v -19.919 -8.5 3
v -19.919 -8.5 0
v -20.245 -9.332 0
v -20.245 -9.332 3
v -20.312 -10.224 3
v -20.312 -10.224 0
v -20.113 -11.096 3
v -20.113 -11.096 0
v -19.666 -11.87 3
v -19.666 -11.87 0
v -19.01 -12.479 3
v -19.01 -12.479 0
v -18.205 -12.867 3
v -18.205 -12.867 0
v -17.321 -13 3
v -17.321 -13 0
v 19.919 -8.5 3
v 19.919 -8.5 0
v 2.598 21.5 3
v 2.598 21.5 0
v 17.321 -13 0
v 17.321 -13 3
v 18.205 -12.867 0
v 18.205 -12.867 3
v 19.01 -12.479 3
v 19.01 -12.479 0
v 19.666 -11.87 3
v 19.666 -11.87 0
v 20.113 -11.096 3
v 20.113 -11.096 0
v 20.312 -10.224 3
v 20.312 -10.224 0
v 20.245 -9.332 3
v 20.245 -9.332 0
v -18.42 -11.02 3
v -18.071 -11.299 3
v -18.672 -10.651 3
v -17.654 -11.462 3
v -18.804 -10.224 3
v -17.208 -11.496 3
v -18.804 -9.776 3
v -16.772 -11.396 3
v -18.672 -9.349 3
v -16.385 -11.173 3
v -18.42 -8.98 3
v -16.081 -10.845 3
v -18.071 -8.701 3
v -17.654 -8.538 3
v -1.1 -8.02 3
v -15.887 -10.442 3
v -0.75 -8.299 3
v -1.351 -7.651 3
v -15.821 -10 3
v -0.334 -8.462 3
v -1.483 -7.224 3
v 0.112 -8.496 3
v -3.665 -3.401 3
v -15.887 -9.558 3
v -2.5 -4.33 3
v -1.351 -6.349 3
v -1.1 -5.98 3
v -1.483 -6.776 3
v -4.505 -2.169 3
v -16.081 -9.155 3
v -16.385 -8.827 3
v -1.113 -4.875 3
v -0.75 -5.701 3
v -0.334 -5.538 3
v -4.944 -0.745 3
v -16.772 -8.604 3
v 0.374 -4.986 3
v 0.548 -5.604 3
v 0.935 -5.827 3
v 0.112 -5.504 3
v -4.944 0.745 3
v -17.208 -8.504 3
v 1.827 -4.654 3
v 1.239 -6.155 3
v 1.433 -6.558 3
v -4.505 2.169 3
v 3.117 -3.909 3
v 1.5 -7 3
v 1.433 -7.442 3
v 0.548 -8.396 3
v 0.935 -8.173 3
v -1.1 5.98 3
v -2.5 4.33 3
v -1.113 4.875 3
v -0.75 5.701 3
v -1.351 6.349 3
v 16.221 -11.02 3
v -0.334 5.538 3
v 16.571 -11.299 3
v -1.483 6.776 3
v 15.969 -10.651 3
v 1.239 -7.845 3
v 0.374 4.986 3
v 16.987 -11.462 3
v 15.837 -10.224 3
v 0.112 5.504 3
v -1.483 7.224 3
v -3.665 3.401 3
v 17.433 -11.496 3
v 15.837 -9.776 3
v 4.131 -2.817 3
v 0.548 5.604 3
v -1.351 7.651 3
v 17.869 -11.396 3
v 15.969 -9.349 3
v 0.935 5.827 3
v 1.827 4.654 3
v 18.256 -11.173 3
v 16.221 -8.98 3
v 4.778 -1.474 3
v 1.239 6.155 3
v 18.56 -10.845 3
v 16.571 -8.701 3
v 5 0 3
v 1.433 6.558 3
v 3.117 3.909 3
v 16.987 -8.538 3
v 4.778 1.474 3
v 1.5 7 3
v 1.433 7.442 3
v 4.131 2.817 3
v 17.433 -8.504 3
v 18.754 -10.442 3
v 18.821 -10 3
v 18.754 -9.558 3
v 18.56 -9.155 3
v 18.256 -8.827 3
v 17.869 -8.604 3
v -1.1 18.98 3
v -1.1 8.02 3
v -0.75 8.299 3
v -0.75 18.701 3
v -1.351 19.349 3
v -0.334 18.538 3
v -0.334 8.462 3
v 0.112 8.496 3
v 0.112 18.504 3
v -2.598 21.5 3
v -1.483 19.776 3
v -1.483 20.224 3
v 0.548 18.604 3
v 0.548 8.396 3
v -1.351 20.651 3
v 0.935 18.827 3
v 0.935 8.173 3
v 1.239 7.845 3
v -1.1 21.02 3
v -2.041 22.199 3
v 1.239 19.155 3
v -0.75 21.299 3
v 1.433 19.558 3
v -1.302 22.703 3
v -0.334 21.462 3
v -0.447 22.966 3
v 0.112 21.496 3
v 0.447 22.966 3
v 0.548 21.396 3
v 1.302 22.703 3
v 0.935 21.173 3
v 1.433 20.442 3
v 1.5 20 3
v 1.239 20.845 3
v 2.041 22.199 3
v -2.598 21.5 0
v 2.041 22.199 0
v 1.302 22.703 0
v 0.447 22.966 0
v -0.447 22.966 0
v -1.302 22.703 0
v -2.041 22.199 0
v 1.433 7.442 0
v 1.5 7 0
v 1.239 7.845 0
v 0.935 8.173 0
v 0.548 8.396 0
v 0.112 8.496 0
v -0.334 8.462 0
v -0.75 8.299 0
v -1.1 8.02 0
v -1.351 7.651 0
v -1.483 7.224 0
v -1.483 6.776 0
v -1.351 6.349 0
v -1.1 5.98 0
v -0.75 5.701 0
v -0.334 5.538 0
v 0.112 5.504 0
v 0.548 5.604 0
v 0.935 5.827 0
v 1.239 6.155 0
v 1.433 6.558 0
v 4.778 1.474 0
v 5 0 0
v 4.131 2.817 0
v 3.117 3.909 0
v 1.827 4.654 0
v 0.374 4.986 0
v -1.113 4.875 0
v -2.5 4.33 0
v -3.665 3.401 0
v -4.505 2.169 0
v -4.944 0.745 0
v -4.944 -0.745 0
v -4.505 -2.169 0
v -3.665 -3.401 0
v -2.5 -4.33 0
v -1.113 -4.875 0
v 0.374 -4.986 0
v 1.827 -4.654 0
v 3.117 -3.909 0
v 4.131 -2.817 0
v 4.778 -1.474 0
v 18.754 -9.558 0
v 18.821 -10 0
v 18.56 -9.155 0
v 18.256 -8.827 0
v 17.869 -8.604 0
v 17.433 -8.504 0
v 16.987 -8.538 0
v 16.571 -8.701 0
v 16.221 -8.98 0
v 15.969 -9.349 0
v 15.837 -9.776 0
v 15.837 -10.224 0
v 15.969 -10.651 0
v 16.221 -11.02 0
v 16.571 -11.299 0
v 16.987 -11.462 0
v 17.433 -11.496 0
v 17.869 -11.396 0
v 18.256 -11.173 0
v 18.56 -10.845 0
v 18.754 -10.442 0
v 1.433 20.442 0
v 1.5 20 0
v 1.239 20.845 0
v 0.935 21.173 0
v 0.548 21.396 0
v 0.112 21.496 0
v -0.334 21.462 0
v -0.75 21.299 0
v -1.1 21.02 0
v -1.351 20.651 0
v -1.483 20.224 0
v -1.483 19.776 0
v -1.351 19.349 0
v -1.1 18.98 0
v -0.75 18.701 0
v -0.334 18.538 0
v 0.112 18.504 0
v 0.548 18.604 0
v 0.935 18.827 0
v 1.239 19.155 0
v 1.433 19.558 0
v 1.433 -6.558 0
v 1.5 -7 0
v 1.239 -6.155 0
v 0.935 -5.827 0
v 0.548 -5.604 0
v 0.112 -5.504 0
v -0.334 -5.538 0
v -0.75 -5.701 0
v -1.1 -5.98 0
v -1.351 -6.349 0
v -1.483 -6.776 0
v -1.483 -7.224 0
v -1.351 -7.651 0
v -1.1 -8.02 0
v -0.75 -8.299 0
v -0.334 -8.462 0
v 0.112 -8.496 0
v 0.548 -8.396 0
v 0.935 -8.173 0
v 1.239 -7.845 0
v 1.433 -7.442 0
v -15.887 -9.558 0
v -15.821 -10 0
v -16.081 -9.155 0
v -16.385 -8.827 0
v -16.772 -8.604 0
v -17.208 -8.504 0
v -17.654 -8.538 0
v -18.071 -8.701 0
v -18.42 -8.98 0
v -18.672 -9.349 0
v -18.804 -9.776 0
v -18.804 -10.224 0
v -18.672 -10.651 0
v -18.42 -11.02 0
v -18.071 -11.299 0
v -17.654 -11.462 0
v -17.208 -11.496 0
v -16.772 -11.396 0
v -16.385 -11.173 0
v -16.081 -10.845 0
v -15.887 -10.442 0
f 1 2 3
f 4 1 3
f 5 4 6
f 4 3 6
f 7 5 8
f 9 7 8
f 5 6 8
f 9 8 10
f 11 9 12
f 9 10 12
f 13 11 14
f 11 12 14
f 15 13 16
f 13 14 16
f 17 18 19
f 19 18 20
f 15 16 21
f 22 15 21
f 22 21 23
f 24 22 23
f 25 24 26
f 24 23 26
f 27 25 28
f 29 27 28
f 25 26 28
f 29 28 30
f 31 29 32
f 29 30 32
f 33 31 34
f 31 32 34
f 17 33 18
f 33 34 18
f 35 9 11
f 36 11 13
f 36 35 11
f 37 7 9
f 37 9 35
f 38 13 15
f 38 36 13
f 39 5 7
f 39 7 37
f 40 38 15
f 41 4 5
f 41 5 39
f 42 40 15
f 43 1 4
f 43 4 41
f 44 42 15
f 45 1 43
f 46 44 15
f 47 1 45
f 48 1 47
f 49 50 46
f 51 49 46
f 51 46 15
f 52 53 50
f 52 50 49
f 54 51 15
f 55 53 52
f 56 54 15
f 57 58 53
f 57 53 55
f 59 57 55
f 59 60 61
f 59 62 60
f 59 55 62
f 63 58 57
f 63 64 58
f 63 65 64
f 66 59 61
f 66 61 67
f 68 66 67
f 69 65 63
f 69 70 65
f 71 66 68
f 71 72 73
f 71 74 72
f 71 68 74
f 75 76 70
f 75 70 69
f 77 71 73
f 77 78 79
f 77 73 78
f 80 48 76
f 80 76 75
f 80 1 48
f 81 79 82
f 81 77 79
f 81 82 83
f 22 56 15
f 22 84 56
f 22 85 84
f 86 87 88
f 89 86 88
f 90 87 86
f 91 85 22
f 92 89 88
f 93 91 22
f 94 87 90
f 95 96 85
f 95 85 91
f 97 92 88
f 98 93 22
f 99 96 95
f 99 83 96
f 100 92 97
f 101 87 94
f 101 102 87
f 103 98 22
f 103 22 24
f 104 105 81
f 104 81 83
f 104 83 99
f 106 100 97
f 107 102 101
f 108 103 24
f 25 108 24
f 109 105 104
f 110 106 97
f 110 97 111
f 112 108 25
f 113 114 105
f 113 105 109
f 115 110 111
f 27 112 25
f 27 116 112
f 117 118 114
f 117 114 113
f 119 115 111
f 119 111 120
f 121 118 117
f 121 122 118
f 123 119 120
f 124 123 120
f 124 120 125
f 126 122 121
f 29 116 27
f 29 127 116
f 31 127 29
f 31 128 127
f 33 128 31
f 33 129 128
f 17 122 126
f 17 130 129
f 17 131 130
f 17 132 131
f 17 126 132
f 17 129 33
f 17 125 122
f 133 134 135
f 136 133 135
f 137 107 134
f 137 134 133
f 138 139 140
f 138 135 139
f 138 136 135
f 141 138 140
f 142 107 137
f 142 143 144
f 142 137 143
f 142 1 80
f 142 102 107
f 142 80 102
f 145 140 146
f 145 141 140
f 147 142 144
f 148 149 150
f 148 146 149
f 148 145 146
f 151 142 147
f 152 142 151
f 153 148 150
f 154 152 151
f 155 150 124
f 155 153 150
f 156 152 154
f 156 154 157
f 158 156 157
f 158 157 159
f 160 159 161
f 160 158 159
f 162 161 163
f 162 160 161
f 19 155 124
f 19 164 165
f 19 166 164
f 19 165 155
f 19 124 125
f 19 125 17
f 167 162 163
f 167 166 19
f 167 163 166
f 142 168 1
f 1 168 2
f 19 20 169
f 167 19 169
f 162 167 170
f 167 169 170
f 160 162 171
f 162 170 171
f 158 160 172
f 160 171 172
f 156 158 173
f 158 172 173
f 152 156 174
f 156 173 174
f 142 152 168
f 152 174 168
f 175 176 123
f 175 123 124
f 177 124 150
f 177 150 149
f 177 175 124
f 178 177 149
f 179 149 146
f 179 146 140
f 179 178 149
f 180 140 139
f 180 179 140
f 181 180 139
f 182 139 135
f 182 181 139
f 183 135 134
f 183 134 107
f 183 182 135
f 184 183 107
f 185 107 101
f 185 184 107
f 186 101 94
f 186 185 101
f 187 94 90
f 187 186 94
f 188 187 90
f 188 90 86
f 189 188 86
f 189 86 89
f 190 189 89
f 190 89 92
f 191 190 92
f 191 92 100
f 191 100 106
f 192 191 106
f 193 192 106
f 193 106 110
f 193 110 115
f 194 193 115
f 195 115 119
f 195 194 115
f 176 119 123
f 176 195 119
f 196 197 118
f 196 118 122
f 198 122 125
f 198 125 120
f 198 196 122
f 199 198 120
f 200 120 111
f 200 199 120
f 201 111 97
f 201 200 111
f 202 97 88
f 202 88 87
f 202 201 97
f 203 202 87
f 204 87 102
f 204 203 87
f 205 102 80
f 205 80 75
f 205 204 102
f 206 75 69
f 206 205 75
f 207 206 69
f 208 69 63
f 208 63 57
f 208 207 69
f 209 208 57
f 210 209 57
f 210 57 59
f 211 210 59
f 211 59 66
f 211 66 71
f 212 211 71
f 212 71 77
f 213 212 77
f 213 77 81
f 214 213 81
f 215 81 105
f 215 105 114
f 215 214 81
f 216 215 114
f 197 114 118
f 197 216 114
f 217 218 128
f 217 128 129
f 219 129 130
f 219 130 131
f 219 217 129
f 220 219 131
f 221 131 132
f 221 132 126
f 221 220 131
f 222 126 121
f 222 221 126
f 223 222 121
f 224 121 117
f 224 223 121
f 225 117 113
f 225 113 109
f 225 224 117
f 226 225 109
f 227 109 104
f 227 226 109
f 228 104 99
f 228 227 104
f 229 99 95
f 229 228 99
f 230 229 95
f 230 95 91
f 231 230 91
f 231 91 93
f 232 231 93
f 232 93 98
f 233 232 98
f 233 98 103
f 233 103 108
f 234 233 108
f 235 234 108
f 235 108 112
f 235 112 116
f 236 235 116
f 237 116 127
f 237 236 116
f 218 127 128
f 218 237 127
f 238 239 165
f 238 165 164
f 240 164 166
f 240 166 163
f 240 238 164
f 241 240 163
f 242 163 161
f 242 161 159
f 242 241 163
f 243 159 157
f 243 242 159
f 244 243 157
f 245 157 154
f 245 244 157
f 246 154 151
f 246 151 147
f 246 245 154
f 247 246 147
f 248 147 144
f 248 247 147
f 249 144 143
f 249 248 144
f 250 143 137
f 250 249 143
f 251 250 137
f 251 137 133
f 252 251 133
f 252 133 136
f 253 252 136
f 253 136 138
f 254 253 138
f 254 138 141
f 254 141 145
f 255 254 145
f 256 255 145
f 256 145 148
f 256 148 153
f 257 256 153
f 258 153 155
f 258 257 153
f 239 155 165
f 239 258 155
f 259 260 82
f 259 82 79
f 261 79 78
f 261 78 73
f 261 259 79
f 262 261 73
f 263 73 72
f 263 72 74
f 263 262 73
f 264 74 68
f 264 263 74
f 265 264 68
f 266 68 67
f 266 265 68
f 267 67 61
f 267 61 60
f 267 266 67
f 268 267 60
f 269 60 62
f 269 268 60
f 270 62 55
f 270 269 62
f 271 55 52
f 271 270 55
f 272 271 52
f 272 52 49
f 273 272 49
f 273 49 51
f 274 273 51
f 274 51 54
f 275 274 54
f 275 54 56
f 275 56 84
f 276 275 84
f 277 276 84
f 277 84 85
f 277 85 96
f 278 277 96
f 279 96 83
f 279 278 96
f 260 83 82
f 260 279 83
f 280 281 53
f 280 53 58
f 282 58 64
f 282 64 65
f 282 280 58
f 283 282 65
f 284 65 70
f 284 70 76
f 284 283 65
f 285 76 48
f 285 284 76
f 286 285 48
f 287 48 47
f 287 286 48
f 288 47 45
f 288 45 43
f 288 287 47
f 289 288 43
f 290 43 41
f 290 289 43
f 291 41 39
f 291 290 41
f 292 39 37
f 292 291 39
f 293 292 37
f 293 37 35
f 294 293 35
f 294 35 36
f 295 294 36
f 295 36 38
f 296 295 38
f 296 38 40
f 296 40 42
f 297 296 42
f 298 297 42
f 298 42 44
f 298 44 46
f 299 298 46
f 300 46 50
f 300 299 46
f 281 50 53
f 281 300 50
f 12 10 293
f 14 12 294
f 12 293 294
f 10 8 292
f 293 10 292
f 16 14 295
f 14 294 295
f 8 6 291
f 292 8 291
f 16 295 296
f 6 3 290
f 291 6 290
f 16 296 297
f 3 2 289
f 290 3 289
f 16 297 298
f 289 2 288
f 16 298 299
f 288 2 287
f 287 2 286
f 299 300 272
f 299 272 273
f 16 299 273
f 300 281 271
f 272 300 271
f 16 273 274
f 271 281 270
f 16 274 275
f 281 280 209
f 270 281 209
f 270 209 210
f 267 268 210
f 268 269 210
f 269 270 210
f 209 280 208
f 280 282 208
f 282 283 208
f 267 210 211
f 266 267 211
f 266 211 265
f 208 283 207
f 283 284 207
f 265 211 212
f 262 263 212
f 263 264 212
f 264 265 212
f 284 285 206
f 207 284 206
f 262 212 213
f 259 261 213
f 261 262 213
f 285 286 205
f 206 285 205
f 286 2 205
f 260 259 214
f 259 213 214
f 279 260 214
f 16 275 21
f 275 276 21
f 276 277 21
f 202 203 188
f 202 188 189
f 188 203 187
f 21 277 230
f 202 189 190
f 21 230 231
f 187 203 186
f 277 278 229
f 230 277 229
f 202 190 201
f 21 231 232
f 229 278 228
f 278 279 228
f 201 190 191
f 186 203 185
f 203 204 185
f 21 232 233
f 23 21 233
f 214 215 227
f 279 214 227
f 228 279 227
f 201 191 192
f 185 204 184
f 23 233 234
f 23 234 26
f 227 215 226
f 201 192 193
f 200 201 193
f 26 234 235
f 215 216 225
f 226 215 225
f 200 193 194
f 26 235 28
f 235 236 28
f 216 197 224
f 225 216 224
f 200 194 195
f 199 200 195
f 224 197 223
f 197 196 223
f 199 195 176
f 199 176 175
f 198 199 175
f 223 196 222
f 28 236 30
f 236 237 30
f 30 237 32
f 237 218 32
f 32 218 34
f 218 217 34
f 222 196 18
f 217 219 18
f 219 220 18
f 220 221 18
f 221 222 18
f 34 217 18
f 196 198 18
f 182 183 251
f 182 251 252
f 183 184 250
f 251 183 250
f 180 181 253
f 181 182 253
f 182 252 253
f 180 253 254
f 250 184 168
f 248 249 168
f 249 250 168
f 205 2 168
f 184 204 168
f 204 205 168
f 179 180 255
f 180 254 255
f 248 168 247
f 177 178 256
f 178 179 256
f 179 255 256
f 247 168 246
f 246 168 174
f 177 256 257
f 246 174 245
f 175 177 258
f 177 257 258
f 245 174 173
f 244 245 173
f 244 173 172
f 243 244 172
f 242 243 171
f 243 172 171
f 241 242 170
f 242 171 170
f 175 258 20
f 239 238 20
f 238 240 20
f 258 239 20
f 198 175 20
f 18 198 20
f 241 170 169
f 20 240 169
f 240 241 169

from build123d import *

# Parameters (mm, degrees)
SKETCH_1_R      = 1.5
SKETCH_1_R_2    = 5
EXTRUDE_1_DEPTH = 3


with BuildPart() as part:
    # 草图1 → 凸台-拉伸1 (new body)
    with BuildSketch(Plane.XY):
        with BuildLine():
            Line((-2.598076211, 21.5), (-19.918584287, -8.5))
            ThreePointArc((-19.918584287, -8.5), (-19.918584287, -11.5), (-17.320508076, -13))
            Line((-17.320508076, -13), (17.320508076, -13))
            ThreePointArc((17.320508076, -13), (19.918584287, -11.5), (19.918584287, -8.5))
            Line((19.918584287, -8.5), (2.598076211, 21.5))
            ThreePointArc((2.598076211, 21.5), (0, 23), (-2.598076211, 21.5))
        make_face()
        with Locations((-17.320508076, -10)):
            Circle(SKETCH_1_R, mode=Mode.SUBTRACT)
        with Locations((0, 20)):
            Circle(SKETCH_1_R, mode=Mode.SUBTRACT)
        with Locations((17.320508076, -10)):
            Circle(SKETCH_1_R, mode=Mode.SUBTRACT)
        Circle(SKETCH_1_R_2, mode=Mode.SUBTRACT)
        with Locations((0, 7)):
            Circle(SKETCH_1_R, mode=Mode.SUBTRACT)
        with Locations((0, -7)):
            Circle(SKETCH_1_R, mode=Mode.SUBTRACT)
    extrude(amount=EXTRUDE_1_DEPTH)


solid = part.part
